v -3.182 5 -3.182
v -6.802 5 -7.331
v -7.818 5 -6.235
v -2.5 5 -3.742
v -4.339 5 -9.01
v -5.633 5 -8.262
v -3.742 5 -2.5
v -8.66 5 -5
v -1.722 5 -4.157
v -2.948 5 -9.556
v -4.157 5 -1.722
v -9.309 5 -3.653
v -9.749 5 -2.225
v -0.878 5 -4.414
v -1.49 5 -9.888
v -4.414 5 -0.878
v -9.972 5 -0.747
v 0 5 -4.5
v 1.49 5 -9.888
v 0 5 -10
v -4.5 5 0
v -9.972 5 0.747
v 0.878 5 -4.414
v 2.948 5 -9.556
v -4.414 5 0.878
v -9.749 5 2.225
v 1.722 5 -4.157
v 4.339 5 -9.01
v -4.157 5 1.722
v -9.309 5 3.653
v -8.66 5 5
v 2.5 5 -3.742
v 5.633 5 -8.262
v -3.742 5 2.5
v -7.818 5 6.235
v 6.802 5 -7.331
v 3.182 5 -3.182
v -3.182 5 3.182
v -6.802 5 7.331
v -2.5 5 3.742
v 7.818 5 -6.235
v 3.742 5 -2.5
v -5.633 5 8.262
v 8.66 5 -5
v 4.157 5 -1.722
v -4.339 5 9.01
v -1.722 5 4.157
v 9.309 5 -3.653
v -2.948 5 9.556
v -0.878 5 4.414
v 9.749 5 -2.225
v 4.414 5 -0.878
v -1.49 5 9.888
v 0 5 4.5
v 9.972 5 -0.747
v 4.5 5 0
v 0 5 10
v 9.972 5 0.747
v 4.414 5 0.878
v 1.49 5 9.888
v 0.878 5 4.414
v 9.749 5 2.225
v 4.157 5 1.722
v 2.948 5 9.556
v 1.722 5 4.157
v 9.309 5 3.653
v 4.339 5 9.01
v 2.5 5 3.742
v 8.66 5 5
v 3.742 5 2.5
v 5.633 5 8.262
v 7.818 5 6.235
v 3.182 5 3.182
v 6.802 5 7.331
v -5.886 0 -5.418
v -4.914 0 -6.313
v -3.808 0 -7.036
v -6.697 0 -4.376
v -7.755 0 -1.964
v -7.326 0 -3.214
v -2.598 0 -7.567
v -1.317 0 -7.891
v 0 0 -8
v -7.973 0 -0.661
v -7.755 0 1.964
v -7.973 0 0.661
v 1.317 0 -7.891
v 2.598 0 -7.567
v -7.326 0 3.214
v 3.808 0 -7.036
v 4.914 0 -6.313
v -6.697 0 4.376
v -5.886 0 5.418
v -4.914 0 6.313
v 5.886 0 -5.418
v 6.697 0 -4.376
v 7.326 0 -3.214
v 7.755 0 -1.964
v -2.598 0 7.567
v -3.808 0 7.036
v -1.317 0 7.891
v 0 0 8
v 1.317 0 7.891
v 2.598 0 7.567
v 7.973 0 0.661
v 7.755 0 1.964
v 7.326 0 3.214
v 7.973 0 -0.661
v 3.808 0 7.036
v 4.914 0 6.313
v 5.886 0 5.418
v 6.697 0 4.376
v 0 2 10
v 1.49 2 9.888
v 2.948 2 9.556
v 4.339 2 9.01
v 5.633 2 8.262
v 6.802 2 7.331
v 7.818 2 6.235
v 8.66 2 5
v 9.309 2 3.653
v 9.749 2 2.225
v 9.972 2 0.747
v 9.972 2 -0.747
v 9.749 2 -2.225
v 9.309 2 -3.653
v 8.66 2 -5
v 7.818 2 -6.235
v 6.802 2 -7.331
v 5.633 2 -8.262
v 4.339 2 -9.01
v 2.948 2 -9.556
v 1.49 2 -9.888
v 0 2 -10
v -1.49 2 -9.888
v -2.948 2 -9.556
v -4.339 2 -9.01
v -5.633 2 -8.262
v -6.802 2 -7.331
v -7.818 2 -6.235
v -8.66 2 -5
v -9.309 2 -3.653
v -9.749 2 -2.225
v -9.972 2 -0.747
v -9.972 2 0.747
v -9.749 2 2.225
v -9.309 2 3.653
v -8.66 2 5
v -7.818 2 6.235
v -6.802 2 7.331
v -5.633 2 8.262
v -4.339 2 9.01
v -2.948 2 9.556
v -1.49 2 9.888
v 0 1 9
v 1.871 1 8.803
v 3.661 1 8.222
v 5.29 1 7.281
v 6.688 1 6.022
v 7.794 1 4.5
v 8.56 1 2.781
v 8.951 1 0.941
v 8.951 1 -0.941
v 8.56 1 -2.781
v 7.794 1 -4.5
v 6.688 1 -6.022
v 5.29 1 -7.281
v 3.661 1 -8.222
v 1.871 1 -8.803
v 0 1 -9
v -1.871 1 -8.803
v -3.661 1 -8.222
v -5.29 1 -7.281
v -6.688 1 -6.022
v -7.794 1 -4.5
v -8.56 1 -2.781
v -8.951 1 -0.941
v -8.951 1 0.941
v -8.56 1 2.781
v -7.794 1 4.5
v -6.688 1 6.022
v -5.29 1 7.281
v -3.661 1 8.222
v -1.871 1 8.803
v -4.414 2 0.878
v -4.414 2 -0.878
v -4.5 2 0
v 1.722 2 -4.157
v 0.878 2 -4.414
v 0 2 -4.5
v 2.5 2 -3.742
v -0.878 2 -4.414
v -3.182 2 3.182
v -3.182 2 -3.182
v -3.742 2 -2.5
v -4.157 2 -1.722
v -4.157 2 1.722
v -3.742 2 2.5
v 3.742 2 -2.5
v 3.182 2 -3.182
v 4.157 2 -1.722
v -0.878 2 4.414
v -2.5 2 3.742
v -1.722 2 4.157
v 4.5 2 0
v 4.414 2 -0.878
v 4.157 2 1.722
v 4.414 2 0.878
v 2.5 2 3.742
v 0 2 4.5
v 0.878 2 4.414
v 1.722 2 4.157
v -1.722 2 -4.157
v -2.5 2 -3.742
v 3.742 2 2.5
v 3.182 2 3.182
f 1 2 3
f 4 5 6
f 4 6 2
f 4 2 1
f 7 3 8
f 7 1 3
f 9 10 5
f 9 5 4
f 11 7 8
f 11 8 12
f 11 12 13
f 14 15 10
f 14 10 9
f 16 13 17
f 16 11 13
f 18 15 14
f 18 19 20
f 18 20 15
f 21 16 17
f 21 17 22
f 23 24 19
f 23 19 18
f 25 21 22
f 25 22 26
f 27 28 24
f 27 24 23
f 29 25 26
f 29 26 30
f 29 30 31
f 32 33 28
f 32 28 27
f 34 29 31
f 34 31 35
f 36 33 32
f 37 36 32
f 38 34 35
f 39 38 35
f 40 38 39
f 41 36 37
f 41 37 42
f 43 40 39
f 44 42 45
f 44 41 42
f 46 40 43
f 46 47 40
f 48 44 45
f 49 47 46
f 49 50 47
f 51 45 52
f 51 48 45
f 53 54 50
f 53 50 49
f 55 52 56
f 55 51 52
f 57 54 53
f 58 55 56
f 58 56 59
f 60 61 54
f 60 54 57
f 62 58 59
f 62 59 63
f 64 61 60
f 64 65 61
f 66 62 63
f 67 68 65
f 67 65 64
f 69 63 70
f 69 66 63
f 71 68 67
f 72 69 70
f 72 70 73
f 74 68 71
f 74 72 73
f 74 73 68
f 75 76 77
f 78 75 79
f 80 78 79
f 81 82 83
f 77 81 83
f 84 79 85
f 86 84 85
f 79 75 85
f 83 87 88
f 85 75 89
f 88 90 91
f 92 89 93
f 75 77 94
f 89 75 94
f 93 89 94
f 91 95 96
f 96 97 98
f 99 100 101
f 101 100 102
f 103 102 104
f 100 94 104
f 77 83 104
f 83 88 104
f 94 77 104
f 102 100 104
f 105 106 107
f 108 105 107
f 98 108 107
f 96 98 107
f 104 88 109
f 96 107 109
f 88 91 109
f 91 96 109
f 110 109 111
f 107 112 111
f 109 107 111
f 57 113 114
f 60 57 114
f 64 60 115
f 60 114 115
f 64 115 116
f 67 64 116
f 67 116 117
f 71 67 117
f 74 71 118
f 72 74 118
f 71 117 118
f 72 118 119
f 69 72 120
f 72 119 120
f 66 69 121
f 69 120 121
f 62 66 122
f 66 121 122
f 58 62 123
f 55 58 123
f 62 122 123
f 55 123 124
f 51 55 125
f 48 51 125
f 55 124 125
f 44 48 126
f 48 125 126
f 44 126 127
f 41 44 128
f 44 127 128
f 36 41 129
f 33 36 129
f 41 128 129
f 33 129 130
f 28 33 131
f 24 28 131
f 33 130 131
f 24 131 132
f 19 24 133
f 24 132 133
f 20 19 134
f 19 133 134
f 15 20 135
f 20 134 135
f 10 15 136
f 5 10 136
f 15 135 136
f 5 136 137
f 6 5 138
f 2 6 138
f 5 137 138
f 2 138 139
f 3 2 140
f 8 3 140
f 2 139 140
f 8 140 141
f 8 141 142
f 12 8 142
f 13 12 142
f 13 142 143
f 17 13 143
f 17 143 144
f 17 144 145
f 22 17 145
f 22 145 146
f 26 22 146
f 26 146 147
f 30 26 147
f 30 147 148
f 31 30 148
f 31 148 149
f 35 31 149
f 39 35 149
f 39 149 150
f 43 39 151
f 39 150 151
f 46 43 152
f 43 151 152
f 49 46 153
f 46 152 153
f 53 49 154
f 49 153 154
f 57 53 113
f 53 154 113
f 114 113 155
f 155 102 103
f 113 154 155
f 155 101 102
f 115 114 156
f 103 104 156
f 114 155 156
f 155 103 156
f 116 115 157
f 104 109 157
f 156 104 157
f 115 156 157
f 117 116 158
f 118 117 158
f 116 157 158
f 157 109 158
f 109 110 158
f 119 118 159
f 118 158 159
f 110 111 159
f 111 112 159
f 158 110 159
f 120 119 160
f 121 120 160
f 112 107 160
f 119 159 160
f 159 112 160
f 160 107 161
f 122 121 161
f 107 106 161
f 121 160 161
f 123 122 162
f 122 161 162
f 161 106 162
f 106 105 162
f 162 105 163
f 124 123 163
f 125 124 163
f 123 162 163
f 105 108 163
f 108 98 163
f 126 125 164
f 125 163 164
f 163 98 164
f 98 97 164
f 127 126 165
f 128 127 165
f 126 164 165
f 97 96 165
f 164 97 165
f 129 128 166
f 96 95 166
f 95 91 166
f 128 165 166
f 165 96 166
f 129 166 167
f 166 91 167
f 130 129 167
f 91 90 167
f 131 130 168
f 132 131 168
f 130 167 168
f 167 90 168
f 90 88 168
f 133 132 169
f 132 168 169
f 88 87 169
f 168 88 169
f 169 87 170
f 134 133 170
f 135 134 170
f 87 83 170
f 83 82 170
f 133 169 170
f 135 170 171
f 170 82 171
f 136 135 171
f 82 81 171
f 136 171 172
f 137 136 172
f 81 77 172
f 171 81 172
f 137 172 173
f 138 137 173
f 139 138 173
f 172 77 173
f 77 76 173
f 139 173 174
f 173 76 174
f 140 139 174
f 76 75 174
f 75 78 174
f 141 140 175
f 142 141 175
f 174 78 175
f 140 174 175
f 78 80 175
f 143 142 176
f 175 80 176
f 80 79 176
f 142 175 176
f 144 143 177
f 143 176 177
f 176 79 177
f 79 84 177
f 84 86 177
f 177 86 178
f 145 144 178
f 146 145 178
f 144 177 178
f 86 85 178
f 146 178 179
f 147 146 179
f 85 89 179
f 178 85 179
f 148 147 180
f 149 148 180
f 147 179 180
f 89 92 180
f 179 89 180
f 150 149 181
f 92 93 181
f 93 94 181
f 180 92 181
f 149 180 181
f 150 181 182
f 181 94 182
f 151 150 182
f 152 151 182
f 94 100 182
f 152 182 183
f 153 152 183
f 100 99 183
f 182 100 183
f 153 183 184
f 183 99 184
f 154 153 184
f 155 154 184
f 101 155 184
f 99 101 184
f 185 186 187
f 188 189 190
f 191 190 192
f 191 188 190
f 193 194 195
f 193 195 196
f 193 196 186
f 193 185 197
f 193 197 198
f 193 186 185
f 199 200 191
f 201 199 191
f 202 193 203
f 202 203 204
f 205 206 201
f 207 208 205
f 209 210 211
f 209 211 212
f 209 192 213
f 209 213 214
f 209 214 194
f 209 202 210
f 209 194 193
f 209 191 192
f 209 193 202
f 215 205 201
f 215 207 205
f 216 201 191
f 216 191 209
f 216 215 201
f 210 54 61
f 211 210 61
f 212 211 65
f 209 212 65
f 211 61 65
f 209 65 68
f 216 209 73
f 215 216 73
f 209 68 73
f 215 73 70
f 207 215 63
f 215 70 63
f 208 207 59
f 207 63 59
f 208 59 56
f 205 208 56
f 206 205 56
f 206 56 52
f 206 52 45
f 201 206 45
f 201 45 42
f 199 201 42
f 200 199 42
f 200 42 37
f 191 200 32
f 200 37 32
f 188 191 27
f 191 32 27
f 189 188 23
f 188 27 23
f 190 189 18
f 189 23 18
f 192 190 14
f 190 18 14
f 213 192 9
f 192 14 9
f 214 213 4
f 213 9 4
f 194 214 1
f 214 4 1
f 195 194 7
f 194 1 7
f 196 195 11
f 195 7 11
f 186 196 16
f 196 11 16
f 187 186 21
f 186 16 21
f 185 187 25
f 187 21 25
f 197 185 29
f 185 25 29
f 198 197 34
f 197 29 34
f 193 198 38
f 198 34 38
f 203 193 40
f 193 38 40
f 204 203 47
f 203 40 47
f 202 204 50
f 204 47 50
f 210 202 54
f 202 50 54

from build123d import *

# Parameters (mm, degrees)
SKETCH_1_R          = 10
EXTRUDE_1_DEPTH     = 5
SKETCH_2_R          = 4.5
CUT_EXTRUDE_1_DEPTH = 3
CHAMFER_1_SIZE      = 2


with BuildPart() as part:
    # 草圖1 → 填料-伸長1 (new body)
    with BuildSketch(Plane(origin=(0, 0, 0), x_dir=(1, 0, 0), z_dir=(0, 1, 0))):
        with Locations(Location((0, 0, 0), (0, 0, 270))):
            Circle(SKETCH_1_R)
    extrude(amount=EXTRUDE_1_DEPTH)

    # 草圖2 → 除料-伸長1 (cut)
    with BuildSketch(Plane(origin=(0, 5, 0), x_dir=(1, 0, 0), z_dir=(0, 1, 0))):
        with Locations(Location((0, 0, 0), (0, 0, 270))):
            Circle(SKETCH_2_R)
    extrude(amount=-CUT_EXTRUDE_1_DEPTH, mode=Mode.SUBTRACT)

    # 導角1
    chamfer_1_edges = [part.edges().sort_by_distance(p)[0] for p in [
        (0, 0, -10),
    ]]
    chamfer(chamfer_1_edges, length=CHAMFER_1_SIZE)


solid = part.part
